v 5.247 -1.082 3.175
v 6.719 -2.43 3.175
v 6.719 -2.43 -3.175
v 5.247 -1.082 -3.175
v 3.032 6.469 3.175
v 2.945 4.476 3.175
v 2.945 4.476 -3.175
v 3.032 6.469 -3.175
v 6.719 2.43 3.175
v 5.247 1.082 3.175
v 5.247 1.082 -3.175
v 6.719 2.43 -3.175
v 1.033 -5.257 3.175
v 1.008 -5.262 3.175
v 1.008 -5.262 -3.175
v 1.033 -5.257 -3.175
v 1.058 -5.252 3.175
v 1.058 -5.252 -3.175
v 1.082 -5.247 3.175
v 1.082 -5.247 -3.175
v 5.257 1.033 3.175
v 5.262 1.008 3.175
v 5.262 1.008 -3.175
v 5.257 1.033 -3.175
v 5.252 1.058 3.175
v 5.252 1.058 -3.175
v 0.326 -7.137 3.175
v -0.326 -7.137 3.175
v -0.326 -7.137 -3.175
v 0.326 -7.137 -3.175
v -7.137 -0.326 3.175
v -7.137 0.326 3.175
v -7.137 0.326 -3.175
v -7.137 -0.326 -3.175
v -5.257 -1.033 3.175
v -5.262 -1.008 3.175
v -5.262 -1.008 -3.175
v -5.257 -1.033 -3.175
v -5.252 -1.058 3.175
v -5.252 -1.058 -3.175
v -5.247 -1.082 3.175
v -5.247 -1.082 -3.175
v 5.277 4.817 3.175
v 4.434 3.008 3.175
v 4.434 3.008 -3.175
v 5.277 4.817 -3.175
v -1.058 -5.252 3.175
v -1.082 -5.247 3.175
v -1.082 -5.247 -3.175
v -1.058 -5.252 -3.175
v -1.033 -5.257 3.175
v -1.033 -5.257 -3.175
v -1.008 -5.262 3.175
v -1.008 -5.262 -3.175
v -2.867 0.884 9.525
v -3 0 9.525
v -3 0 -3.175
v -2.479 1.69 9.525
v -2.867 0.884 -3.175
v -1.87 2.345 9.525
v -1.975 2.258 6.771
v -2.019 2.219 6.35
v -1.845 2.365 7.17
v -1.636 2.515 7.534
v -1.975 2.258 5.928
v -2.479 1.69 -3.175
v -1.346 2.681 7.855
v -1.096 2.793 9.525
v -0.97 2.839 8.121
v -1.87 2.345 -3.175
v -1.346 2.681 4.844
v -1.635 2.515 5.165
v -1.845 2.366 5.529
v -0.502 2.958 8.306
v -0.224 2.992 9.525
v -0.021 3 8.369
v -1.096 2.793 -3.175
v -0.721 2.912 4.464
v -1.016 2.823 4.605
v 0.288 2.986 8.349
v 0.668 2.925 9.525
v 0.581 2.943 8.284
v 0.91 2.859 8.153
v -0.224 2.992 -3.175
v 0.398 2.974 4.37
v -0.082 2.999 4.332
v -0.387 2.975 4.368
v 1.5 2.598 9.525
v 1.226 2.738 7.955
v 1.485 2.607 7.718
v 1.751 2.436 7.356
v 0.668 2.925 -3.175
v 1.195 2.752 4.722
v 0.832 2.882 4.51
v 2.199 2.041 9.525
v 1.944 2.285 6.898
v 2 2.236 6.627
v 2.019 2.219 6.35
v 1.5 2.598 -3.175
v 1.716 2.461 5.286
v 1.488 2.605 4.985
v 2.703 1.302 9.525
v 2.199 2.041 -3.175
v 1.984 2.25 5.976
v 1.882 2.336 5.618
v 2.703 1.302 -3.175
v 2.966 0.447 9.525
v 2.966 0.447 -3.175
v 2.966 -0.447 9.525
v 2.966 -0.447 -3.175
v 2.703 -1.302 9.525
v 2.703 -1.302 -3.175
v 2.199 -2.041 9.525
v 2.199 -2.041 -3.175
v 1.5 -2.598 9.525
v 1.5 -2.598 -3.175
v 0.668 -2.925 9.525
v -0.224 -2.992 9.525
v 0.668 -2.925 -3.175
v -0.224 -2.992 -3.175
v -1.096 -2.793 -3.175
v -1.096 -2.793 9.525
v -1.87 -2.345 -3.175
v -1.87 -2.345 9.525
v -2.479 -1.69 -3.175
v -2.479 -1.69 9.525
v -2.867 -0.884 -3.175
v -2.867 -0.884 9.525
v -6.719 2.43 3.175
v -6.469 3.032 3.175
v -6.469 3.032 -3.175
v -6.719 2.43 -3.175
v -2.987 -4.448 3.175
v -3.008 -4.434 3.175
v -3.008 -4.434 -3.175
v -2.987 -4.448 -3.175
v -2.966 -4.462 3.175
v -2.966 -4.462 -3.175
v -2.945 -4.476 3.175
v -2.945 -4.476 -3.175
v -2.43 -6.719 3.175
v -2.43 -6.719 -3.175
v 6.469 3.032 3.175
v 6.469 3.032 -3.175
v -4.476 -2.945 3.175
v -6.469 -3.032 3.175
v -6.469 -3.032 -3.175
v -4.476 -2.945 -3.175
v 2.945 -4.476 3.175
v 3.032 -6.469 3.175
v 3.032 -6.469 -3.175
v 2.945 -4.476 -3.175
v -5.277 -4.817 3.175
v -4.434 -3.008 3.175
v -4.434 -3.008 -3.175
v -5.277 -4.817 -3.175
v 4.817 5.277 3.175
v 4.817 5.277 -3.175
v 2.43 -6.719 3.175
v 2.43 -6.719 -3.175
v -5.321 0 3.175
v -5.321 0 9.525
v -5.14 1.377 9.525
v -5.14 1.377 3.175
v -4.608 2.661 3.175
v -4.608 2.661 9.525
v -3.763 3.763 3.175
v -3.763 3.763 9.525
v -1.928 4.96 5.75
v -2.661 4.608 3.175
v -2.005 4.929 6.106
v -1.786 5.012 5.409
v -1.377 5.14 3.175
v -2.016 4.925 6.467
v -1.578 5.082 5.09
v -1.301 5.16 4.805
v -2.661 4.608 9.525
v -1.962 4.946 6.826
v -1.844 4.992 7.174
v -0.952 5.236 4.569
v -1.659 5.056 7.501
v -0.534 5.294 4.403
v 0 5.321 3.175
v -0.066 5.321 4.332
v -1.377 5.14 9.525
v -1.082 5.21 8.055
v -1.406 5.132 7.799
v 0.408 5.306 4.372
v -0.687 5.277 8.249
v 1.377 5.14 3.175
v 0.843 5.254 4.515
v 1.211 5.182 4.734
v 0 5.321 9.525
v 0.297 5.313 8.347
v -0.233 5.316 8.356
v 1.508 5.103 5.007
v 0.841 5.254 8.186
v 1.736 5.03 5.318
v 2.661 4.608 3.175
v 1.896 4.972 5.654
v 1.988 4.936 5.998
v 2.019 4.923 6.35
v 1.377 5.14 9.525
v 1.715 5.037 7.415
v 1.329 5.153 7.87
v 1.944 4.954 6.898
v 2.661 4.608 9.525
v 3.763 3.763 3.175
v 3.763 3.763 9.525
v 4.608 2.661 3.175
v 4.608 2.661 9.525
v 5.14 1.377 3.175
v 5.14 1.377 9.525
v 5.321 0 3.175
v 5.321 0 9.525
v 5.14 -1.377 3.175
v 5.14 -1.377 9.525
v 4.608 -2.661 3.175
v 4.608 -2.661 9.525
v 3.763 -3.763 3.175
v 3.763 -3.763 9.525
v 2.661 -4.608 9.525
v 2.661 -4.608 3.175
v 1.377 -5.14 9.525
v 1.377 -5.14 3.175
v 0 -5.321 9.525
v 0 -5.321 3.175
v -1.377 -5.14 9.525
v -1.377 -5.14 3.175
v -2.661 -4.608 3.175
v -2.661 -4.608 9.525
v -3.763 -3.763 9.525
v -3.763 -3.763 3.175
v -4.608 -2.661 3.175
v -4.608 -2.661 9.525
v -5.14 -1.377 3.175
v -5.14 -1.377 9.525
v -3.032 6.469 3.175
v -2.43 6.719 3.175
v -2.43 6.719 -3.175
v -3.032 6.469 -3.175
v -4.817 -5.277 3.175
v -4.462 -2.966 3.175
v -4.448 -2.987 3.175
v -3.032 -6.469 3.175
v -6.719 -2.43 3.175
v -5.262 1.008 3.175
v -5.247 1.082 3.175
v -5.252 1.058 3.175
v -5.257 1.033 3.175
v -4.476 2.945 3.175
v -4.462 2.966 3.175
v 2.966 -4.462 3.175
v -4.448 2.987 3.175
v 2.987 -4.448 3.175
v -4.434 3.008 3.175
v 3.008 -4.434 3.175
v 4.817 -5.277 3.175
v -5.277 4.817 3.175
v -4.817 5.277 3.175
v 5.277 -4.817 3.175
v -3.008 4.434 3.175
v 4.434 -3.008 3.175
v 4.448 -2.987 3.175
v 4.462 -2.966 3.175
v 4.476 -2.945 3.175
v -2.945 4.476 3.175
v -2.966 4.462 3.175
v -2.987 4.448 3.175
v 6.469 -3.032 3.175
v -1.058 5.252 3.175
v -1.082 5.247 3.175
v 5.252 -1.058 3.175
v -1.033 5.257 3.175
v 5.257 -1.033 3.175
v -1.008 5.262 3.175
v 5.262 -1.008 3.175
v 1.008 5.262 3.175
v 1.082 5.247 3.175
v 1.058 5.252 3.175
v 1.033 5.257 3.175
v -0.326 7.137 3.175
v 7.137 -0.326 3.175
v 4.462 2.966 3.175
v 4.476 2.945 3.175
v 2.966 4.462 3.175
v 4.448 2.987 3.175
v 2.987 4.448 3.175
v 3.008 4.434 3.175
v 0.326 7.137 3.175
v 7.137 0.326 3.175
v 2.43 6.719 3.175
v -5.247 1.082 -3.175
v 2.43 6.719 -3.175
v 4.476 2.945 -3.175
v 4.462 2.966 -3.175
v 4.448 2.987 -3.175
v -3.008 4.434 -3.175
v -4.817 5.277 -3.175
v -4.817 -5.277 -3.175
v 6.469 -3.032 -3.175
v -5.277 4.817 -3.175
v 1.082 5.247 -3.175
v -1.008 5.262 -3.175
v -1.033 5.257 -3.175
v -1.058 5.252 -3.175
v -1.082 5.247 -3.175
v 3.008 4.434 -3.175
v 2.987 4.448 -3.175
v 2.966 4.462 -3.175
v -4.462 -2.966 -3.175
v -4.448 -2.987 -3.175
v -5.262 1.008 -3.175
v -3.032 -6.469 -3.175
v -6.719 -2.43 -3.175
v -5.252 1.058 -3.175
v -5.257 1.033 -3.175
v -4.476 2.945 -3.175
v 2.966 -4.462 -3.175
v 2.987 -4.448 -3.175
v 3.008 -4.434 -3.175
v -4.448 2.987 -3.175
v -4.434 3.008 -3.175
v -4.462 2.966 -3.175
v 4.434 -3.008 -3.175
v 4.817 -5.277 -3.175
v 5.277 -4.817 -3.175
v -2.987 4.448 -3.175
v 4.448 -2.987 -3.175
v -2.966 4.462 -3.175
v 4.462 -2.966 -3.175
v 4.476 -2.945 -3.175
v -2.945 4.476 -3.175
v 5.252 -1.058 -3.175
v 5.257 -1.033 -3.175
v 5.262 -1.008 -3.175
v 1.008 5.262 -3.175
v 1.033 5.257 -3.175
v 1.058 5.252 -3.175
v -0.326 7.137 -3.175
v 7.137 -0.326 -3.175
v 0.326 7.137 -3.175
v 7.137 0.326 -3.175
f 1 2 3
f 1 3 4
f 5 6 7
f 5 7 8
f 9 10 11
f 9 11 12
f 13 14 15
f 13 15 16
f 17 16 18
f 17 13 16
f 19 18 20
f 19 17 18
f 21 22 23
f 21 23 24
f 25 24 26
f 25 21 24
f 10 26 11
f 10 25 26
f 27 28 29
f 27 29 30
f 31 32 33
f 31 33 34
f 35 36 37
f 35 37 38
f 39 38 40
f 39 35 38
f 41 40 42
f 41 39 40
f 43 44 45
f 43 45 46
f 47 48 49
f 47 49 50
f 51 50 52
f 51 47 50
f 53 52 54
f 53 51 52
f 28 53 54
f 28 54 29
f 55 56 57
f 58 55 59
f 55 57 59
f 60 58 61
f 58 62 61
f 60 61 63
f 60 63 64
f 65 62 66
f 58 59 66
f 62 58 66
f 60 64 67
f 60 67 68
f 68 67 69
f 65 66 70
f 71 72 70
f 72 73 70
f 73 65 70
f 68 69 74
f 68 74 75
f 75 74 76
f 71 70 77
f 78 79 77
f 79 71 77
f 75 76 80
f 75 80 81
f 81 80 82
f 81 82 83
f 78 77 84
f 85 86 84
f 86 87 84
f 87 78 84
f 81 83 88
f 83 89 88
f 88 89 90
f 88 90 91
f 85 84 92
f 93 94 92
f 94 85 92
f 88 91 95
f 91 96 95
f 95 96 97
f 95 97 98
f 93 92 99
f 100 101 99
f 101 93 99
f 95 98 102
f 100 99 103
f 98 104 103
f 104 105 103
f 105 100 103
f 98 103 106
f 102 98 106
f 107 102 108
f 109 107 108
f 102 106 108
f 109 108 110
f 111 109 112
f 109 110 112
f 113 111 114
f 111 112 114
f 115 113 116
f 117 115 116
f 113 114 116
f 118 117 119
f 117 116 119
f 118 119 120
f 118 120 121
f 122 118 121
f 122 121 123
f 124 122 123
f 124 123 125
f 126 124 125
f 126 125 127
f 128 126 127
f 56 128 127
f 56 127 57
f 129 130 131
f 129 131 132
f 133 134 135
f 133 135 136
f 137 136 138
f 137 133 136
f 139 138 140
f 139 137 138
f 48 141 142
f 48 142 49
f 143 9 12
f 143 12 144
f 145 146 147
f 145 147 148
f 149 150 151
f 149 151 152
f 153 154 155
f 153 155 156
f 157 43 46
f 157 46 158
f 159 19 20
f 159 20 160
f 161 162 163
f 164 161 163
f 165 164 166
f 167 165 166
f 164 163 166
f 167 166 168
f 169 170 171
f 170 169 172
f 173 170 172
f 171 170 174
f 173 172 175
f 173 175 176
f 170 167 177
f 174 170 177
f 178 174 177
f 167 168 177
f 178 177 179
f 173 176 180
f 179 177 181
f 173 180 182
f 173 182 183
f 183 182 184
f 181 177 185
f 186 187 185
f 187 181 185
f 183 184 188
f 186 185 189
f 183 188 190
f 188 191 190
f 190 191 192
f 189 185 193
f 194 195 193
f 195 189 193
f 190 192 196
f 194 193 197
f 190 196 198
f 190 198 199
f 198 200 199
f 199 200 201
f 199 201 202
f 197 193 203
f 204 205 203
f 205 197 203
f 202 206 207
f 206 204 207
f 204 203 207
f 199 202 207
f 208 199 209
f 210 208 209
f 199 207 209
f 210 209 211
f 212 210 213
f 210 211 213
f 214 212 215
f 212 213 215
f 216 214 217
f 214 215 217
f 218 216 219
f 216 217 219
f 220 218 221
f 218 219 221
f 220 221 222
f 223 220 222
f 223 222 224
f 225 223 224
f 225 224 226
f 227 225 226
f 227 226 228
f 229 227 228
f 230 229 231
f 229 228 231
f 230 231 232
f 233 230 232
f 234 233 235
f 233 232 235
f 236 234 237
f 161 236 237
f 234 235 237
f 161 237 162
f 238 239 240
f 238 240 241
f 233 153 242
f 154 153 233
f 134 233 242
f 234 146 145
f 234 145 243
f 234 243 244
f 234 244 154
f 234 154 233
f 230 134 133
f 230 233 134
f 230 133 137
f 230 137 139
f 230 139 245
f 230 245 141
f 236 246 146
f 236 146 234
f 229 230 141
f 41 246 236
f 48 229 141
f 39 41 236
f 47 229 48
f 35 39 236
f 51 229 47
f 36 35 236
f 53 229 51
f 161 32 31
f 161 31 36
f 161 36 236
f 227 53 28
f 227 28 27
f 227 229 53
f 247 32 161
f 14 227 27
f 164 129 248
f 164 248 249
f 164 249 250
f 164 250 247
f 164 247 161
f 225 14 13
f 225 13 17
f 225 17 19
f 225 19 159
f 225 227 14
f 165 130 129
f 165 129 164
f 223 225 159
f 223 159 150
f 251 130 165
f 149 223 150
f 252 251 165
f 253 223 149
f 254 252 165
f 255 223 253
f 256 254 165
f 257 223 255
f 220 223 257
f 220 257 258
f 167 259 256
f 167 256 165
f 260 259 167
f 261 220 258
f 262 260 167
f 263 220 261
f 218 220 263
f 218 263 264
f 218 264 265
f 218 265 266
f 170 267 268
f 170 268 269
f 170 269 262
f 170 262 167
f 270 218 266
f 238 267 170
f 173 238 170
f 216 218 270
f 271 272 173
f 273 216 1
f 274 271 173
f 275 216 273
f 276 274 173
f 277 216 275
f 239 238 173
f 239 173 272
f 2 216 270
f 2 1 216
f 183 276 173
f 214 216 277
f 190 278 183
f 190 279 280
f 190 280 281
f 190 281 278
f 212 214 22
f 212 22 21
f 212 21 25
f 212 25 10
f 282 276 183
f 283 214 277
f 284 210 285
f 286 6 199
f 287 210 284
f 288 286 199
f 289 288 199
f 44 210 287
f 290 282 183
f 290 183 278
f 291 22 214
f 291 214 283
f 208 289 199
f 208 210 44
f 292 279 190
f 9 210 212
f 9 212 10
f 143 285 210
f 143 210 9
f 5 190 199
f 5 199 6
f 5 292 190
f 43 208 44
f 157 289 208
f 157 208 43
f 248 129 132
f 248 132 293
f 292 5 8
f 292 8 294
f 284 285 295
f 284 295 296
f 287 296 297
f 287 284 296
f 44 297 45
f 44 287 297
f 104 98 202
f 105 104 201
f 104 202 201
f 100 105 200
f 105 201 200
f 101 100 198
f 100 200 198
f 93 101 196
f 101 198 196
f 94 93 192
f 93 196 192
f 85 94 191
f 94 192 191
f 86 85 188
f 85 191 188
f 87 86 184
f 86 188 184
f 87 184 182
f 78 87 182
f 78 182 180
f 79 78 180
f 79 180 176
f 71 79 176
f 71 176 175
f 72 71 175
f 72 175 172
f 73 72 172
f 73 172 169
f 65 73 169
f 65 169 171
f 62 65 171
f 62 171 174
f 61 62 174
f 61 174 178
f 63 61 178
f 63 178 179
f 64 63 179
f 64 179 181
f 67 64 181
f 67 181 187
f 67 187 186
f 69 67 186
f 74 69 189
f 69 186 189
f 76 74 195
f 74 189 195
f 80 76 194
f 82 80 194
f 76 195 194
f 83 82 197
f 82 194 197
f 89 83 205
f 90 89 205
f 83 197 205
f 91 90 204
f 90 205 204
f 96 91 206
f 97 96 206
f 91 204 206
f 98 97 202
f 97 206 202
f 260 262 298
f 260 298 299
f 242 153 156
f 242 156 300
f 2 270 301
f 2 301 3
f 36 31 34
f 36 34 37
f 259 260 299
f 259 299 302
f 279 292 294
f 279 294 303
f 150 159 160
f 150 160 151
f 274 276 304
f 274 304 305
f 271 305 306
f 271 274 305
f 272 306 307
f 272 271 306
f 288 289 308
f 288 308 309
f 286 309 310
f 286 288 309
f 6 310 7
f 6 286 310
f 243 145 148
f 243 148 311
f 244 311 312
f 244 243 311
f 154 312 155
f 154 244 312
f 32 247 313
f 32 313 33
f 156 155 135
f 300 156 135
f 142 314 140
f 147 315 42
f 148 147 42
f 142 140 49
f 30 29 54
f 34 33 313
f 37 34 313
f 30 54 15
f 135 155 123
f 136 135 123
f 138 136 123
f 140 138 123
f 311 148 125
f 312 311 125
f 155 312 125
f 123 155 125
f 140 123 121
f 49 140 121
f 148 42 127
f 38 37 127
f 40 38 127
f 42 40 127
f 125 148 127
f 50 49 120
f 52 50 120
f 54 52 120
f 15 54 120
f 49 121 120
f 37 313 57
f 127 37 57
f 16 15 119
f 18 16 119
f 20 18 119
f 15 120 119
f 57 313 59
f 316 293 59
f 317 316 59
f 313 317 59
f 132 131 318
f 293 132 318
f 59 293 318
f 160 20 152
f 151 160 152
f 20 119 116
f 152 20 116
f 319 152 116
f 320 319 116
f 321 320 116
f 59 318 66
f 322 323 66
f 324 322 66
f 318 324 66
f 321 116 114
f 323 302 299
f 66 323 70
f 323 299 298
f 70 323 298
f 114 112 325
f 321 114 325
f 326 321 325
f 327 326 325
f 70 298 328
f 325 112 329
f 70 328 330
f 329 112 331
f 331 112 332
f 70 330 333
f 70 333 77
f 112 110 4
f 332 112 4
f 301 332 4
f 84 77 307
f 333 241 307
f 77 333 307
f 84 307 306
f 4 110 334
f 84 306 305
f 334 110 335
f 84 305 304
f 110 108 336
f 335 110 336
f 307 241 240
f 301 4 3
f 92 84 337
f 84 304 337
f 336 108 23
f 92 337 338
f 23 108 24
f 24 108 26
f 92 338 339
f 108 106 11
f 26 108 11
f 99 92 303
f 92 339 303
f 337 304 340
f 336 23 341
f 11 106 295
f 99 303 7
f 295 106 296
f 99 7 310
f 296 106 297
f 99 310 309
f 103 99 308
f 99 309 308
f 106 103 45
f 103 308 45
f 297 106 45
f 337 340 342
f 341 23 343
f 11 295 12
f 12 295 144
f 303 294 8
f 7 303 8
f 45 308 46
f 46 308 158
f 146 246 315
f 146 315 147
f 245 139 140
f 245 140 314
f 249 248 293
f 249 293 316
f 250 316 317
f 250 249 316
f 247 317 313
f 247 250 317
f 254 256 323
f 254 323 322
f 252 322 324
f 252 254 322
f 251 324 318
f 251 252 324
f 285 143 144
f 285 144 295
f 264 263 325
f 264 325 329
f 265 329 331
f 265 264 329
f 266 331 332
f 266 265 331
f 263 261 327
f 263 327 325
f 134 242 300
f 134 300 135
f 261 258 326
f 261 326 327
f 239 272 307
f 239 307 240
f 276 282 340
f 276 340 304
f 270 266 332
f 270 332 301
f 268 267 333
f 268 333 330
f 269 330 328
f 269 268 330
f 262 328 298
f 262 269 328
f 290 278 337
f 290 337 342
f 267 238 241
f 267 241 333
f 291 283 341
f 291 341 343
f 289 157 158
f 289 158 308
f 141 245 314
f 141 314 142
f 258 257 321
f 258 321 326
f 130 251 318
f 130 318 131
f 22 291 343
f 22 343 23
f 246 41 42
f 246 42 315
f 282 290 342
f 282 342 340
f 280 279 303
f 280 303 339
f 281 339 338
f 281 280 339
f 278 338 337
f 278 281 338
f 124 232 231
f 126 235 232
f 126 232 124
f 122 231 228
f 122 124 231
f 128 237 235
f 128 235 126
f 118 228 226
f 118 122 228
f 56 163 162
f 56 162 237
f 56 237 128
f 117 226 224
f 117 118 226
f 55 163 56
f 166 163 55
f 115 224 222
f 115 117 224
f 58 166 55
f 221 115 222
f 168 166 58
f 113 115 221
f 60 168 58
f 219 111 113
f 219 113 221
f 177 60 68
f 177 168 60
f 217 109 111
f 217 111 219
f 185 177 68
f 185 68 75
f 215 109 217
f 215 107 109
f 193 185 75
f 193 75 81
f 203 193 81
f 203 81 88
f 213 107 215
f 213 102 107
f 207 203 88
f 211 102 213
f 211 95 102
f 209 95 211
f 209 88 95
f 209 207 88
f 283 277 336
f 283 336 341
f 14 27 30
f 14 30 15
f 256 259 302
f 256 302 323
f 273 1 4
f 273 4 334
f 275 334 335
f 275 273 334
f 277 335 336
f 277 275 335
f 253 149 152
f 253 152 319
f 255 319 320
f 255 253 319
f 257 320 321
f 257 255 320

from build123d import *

# Parameters (mm, degrees)
BOSS_EXTRUDE1_DEPTH              = 6.35
SKETCH2_W                        = 5.3213
SKETCH2_H                        = 6.35
F_12_CLEARANCE_HOLE1_D           = 6
F_21_0_159_DIAMETER_HOLE1_REACH  = 19.23
F_21_0_159_DIAMETER_HOLE1_BORE_R = 2.0193


with BuildPart() as part:
    # Sketch1 → Boss-Extrude1 (new body)
    with BuildSketch(Plane.XY.offset(3.175)):
        with BuildLine():
            Line((2.945181061, 4.475719374), (3.032230323, 6.469475256))
            Line((3.032230323, 6.469475256), (2.430499075, 6.7187205))
            Line((2.430499075, 6.7187205), (1.082253901, 5.247369083))
            ThreePointArc((1.082253901, 5.247369083), (1.045257317, 5.254863741), (1.008208849, 5.262097559))
            Line((1.008208849, 5.262097559), (0.325654523, 7.137400133))
            Line((0.325654523, 7.137400133), (-0.325654702, 7.137400133))
            Line((-0.325654702, 7.137400133), (-1.008209026, 5.262097541))
            ThreePointArc((-1.008209026, 5.262097541), (-1.045257435, 5.254863734), (-1.082253959, 5.247369087))
            Line((-1.082253959, 5.247369087), (-2.43049913, 6.718720502))
            Line((-2.43049913, 6.718720502), (-3.03223038, 6.469475257))
            Line((-3.03223038, 6.469475257), (-2.945181121, 4.475719388))
            ThreePointArc((-2.945181121, 4.475719388), (-2.976641184, 4.454858374), (-3.007953492, 4.433776229))
            Line((-3.007953492, 4.433776229), (-4.816631407, 5.277176573))
            Line((-4.816631407, 5.277176573), (-5.277176625, 4.816631474))
            Line((-5.277176625, 4.816631474), (-4.433776215, 3.007953457))
            ThreePointArc((-4.433776215, 3.007953457), (-4.454858319, 2.976641205), (-4.475719295, 2.945181199))
            Line((-4.475719295, 2.945181199), (-6.469475174, 3.032230463))
            Line((-6.469475174, 3.032230463), (-6.718720419, 2.430499213))
            Line((-6.718720419, 2.430499213), (-5.247368979, 1.082254018))
            ThreePointArc((-5.247368979, 1.082254018), (-5.254863646, 1.045257392), (-5.26209747, 1.008208882))
            Line((-5.26209747, 1.008208882), (-7.137400023, 0.325654551))
            Line((-7.137400023, 0.325654551), (-7.137400023, -0.325654674))
            Line((-7.137400023, -0.325654674), (-5.262097383, -1.008209015))
            ThreePointArc((-5.262097383, -1.008209015), (-5.254863591, -1.045257342), (-5.24736896, -1.082253784))
            Line((-5.24736896, -1.082253784), (-6.71872042, -2.430498991))
            Line((-6.71872042, -2.430498991), (-6.469475175, -3.032230242))
            Line((-6.469475175, -3.032230242), (-4.475719227, -2.945180979))
            ThreePointArc((-4.475719227, -2.945180979), (-4.454858236, -2.976641007), (-4.433776114, -3.007953281))
            Line((-4.433776114, -3.007953281), (-5.277176492, -4.816631269))
            Line((-5.277176492, -4.816631269), (-4.816631393, -5.277176487))
            Line((-4.816631393, -5.277176487), (-3.007953296, -4.433776039))
            ThreePointArc((-3.007953296, -4.433776039), (-2.976641082, -4.454858118), (-2.945181114, -4.475719068))
            Line((-2.945181114, -4.475719068), (-3.03223038, -6.469475037))
            Line((-3.03223038, -6.469475037), (-2.43049913, -6.718720282))
            Line((-2.43049913, -6.718720282), (-1.082253881, -5.24736878))
            ThreePointArc((-1.082253881, -5.24736878), (-1.045257351, -5.254863427), (-1.008208937, -5.262097234))
            Line((-1.008208937, -5.262097234), (-0.325654579, -7.137399864))
            Line((-0.325654579, -7.137399864), (0.325654646, -7.137399864))
            Line((0.325654646, -7.137399864), (1.008209007, -5.262097205))
            ThreePointArc((1.008209007, -5.262097205), (1.045257357, -5.25486341), (1.082253822, -5.247368775))
            Line((1.082253822, -5.247368775), (2.430499075, -6.718720281))
            Line((2.430499075, -6.718720281), (3.032230325, -6.469475036))
            Line((3.032230325, -6.469475036), (2.945181058, -4.475719052))
            ThreePointArc((2.945181058, -4.475719052), (2.976641071, -4.454858071), (3.00795333, -4.433775961))
            Line((3.00795333, -4.433775961), (4.816631352, -5.277176352))
            Line((4.816631352, -5.277176352), (5.27717657, -4.816631253))
            Line((5.27717657, -4.816631253), (4.433776119, -3.007953154))
            ThreePointArc((4.433776119, -3.007953154), (4.454858198, -2.976640942), (4.475719148, -2.945180976))
            Line((4.475719148, -2.945180976), (6.469475118, -3.032230242))
            Line((6.469475118, -3.032230242), (6.718720363, -2.430498991))
            Line((6.718720363, -2.430498991), (5.247368883, -1.082253764))
            ThreePointArc((5.247368883, -1.082253764), (5.254863535, -1.045257218), (5.262097345, -1.008208788))
            Line((5.262097345, -1.008208788), (7.137399945, -0.32565444))
            Line((7.137399945, -0.32565444), (7.137399945, 0.325654785))
            Line((7.137399945, 0.325654785), (5.262097343, 1.008209124))
            ThreePointArc((5.262097343, 1.008209124), (5.254863542, 1.045257505), (5.247368901, 1.082254002))
            Line((5.247368901, 1.082254002), (6.718720362, 2.430499213))
            Line((6.718720362, 2.430499213), (6.469475118, 3.032230461))
            Line((6.469475118, 3.032230461), (4.475719213, 2.9451812))
            ThreePointArc((4.475719213, 2.9451812), (4.45485821, 2.976641248), (4.433776076, 3.007953541))
            Line((4.433776076, 3.007953541), (5.277176433, 4.81663149))
            Line((5.277176433, 4.81663149), (4.816631336, 5.277176706))
            Line((4.816631336, 5.277176706), (3.007953315, 4.433776294))
            ThreePointArc((3.007953315, 4.433776294), (2.976641065, 4.454858399), (2.945181061, 4.475719374))
        make_face()
    extrude(amount=-BOSS_EXTRUDE1_DEPTH)

    # Sketch2 → Revolve1 (revolve)
    with BuildSketch(Plane.XZ, mode=Mode.PRIVATE) as revolve1_sk:
        with Locations((2.66065, 6.35)):
            Rectangle(SKETCH2_W, SKETCH2_H)
    revolve(revolve1_sk.sketch.rotate(Axis((0, 0, 9.525), (0, 0, -1)), 180), axis=Axis((0, 0, 9.525), (0, 0, -1)))

    # #12 Clearance Hole1 (through all)
    with Locations(Plane.XY.offset(9.525)):
        with Locations((0, 0)):
            Hole(F_12_CLEARANCE_HOLE1_D / 2)

    # #21 (0.159) Diameter Hole1 bore (on position points) → #21 (0.159) Diameter Hole1 (cut, up to next)
    with BuildSketch(Plane(origin=(0, 5.3213, 6.35), x_dir=(1, 0, 0), z_dir=(0, 1, 0)), mode=Mode.PRIVATE) as f_21_0_159_diameter_hole1_sk1:
        Circle(F_21_0_159_DIAMETER_HOLE1_BORE_R)
    f_21_0_159_diameter_hole1_tool1 = extrude(f_21_0_159_diameter_hole1_sk1.sketch, amount=-F_21_0_159_DIAMETER_HOLE1_REACH, mode=Mode.PRIVATE) & part.part
    add(f_21_0_159_diameter_hole1_tool1.solids().sort_by_distance((0, 5.3213, 6.35))[0], mode=Mode.SUBTRACT)


solid = part.part
